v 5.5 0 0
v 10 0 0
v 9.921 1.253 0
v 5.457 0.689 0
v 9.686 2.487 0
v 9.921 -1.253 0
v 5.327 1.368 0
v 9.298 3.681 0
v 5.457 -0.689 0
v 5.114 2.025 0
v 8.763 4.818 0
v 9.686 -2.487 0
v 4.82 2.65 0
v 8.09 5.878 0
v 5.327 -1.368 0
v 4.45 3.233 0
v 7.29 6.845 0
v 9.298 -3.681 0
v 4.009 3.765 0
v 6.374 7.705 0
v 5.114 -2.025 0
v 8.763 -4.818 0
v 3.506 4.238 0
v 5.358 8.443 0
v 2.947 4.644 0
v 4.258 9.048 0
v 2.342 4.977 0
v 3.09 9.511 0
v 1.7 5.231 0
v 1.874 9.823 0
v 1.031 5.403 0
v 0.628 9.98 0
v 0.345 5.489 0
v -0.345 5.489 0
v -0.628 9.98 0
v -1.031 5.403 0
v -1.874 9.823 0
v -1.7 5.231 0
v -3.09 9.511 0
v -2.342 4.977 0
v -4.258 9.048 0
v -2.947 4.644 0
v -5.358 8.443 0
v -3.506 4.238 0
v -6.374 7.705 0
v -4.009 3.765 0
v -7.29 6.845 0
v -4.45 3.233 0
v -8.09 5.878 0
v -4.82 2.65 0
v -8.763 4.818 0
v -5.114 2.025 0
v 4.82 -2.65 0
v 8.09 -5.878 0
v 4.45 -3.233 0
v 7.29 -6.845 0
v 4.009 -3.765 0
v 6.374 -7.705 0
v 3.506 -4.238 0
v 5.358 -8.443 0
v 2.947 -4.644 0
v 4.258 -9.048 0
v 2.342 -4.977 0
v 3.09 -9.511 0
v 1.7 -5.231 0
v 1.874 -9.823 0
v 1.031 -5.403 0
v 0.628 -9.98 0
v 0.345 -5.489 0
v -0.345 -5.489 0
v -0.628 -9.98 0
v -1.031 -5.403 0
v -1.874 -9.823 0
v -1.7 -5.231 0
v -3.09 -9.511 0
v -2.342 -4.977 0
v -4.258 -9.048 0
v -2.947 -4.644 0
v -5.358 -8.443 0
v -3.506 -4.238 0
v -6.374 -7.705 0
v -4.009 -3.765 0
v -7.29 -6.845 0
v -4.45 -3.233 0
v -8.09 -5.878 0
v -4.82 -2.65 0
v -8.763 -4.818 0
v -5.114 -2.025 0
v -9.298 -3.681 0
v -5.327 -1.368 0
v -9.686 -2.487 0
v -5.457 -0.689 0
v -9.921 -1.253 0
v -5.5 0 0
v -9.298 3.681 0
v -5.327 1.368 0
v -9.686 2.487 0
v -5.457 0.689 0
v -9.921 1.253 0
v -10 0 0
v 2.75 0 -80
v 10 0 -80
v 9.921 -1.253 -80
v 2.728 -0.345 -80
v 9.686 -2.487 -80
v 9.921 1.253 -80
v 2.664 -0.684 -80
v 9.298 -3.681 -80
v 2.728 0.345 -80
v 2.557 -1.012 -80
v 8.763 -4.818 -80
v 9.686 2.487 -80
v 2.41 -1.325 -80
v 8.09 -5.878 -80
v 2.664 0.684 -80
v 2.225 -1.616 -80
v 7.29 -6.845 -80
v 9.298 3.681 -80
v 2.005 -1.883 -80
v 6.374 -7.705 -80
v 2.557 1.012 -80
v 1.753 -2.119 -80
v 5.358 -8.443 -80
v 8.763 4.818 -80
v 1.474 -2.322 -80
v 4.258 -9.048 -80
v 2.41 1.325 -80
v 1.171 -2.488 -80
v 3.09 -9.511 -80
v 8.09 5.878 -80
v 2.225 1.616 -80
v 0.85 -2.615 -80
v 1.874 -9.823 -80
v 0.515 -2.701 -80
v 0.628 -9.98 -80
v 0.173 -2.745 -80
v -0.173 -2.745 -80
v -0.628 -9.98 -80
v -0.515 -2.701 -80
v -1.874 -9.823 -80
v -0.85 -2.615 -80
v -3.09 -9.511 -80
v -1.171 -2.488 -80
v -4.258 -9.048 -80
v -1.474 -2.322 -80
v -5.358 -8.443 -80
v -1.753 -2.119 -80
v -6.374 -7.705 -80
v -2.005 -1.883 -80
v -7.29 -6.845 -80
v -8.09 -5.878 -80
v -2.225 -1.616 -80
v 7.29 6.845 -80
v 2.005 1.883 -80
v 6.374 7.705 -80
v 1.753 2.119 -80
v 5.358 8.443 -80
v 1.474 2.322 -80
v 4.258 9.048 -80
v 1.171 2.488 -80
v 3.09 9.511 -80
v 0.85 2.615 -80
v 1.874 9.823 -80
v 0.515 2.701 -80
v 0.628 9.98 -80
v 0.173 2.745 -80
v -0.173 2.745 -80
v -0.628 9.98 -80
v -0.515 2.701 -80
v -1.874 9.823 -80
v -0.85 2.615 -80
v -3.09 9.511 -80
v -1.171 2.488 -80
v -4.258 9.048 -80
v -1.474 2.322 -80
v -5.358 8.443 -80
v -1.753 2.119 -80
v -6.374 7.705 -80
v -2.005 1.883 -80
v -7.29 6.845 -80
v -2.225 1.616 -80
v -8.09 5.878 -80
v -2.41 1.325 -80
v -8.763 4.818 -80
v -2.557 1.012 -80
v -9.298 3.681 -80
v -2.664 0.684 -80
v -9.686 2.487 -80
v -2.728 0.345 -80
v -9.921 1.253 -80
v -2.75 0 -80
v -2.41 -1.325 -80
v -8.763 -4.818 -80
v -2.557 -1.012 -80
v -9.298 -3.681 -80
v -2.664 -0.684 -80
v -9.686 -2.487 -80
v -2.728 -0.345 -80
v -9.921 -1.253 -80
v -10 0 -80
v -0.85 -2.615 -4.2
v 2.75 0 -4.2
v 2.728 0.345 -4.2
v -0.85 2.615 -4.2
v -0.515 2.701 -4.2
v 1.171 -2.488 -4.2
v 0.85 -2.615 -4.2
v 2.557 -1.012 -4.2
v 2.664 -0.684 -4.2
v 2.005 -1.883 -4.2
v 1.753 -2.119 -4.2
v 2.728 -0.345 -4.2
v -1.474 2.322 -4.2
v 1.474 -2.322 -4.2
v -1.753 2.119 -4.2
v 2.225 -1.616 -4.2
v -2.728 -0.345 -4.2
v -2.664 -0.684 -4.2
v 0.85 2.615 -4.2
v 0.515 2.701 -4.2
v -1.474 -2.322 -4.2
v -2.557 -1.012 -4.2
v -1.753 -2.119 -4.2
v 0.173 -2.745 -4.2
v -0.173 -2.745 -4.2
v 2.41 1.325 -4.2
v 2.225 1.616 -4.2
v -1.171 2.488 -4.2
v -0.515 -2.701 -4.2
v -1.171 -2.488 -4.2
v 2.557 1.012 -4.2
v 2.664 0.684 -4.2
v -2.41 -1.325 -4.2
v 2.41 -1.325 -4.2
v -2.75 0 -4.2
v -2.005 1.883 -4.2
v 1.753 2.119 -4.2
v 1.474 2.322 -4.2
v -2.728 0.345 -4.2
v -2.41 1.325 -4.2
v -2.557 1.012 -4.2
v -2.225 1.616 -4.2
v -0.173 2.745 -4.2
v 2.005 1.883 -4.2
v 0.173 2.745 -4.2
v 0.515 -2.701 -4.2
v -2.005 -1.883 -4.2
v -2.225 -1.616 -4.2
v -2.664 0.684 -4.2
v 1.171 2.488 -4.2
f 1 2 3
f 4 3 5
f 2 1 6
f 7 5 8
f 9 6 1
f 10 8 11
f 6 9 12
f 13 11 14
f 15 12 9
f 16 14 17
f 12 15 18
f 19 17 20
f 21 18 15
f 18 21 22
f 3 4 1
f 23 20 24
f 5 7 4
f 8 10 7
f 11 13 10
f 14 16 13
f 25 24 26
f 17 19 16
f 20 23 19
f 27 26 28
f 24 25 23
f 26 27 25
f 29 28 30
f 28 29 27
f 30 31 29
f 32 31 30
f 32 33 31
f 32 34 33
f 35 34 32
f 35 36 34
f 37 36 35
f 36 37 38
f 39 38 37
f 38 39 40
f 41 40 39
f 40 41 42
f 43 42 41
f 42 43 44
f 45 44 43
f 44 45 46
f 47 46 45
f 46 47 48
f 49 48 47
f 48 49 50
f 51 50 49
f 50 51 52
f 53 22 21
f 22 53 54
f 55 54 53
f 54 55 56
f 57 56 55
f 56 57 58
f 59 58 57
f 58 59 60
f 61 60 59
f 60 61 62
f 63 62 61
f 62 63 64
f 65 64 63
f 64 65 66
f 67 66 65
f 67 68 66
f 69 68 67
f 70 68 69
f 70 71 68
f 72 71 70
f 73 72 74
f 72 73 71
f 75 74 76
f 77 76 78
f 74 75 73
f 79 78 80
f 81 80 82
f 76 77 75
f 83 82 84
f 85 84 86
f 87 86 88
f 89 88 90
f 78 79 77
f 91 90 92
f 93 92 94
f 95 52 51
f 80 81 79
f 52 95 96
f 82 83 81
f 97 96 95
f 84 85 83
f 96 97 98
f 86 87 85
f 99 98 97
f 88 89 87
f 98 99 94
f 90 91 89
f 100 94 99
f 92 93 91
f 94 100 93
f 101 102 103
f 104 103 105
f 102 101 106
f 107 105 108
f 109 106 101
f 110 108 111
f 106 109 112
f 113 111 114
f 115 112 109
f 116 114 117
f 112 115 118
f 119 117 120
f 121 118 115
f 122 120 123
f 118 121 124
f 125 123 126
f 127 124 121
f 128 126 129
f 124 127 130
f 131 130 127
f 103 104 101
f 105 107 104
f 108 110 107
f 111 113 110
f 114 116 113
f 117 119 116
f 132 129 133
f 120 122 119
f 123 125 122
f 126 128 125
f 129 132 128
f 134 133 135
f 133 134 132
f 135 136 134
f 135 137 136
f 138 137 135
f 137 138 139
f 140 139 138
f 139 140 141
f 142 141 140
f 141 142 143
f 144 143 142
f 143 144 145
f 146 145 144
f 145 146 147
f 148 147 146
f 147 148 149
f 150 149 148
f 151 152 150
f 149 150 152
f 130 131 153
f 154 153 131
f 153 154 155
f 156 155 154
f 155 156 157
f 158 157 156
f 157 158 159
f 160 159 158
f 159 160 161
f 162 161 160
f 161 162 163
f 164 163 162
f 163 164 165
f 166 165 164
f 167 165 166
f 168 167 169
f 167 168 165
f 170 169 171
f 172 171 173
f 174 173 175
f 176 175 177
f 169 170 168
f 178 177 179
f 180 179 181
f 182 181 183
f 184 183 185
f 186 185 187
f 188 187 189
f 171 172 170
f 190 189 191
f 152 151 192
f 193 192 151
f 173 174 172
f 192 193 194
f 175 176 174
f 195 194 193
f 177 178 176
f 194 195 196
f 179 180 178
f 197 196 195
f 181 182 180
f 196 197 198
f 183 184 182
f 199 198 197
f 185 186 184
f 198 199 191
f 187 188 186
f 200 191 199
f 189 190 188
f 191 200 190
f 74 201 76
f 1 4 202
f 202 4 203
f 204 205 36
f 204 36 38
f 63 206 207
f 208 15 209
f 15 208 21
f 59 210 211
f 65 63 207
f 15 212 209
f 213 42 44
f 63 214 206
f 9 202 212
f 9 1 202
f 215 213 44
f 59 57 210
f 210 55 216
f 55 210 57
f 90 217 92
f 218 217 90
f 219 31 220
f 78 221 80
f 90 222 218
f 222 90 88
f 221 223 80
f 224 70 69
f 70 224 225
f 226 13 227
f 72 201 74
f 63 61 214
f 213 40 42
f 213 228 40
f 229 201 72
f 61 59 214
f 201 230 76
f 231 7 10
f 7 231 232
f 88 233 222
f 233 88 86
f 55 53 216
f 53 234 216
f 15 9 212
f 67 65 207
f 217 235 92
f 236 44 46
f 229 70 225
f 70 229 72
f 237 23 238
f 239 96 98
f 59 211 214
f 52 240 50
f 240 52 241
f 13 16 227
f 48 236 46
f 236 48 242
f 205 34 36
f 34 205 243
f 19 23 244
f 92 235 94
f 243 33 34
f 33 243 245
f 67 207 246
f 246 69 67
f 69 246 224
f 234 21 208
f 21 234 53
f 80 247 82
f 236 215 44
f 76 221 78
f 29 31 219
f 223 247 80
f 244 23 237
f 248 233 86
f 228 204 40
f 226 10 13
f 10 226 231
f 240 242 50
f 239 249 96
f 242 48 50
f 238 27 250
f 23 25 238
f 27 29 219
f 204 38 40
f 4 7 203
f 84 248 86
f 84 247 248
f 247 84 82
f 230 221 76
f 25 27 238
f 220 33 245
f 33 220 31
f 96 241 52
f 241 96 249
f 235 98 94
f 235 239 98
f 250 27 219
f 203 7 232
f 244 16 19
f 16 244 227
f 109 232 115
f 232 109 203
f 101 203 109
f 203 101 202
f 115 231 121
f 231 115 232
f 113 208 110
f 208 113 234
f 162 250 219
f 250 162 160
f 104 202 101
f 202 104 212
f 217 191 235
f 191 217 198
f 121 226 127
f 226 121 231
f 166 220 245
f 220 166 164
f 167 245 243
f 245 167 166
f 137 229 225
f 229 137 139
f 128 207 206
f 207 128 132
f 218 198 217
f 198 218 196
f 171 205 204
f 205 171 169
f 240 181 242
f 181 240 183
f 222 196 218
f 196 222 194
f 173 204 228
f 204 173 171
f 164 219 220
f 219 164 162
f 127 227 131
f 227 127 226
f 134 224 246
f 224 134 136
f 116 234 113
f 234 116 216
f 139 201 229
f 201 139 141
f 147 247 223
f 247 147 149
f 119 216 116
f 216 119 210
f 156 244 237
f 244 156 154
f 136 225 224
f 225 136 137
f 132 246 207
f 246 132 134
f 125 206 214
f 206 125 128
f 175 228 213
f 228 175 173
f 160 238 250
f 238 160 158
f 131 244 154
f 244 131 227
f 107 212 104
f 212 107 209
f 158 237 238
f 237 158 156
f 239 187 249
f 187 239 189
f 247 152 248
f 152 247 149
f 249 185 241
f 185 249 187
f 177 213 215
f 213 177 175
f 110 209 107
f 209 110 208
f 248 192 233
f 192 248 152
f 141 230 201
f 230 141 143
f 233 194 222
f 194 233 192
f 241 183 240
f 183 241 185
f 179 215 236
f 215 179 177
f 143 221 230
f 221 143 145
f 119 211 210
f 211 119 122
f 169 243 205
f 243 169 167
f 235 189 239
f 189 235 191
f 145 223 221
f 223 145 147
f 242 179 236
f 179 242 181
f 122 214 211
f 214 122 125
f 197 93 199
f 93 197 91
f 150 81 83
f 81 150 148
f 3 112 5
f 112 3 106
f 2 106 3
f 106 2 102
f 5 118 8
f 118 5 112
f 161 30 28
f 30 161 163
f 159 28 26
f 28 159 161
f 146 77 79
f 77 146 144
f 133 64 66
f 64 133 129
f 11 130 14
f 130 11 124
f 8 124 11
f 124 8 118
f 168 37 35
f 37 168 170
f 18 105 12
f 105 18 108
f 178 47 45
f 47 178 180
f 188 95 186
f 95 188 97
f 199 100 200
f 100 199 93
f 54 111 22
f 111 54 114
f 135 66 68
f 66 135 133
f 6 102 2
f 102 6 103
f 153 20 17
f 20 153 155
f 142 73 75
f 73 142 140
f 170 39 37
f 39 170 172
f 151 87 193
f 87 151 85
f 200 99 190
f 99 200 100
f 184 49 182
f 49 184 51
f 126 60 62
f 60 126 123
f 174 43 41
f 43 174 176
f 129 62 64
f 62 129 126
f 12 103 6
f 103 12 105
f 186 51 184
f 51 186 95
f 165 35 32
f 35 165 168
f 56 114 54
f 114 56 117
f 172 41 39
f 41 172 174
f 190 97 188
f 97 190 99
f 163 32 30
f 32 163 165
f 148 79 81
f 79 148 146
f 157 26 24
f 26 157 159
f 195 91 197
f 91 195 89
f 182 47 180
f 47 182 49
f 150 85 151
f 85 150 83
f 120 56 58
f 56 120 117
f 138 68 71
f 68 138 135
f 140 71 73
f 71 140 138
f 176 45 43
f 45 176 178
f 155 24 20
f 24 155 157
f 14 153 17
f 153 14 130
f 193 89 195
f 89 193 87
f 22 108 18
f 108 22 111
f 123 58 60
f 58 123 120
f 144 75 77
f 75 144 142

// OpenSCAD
$fn = 50;


difference() {
	union() {
		translate(v = [0, 0, -80.0000000000]) {
			cylinder(h = 80, r = 10.0000000000);
		}
	}
	union() {
		translate(v = [0, 0, 0]) {
			rotate(a = [0, 0, 0]) {
				difference() {
					union() {
						#translate(v = [0, 0, -80.0000000000]) {
							cylinder(h = 80, r = 2.2500000000);
						}
						#translate(v = [0, 0, -4.2000000000]) {
							cylinder(h = 4.2000000000, r = 10.0000000000, r1 = 2.7500000000, r2 = 5.5000000000);
						}
						#translate(v = [0, 0, -80.0000000000]) {
							cylinder(h = 80, r = 2.7500000000);
						}
						#translate(v = [0, 0, -80.0000000000]) {
							cylinder(h = 80, r = 2.2500000000);
						}
					}
					union();
				}
			}
		}
	}
}
